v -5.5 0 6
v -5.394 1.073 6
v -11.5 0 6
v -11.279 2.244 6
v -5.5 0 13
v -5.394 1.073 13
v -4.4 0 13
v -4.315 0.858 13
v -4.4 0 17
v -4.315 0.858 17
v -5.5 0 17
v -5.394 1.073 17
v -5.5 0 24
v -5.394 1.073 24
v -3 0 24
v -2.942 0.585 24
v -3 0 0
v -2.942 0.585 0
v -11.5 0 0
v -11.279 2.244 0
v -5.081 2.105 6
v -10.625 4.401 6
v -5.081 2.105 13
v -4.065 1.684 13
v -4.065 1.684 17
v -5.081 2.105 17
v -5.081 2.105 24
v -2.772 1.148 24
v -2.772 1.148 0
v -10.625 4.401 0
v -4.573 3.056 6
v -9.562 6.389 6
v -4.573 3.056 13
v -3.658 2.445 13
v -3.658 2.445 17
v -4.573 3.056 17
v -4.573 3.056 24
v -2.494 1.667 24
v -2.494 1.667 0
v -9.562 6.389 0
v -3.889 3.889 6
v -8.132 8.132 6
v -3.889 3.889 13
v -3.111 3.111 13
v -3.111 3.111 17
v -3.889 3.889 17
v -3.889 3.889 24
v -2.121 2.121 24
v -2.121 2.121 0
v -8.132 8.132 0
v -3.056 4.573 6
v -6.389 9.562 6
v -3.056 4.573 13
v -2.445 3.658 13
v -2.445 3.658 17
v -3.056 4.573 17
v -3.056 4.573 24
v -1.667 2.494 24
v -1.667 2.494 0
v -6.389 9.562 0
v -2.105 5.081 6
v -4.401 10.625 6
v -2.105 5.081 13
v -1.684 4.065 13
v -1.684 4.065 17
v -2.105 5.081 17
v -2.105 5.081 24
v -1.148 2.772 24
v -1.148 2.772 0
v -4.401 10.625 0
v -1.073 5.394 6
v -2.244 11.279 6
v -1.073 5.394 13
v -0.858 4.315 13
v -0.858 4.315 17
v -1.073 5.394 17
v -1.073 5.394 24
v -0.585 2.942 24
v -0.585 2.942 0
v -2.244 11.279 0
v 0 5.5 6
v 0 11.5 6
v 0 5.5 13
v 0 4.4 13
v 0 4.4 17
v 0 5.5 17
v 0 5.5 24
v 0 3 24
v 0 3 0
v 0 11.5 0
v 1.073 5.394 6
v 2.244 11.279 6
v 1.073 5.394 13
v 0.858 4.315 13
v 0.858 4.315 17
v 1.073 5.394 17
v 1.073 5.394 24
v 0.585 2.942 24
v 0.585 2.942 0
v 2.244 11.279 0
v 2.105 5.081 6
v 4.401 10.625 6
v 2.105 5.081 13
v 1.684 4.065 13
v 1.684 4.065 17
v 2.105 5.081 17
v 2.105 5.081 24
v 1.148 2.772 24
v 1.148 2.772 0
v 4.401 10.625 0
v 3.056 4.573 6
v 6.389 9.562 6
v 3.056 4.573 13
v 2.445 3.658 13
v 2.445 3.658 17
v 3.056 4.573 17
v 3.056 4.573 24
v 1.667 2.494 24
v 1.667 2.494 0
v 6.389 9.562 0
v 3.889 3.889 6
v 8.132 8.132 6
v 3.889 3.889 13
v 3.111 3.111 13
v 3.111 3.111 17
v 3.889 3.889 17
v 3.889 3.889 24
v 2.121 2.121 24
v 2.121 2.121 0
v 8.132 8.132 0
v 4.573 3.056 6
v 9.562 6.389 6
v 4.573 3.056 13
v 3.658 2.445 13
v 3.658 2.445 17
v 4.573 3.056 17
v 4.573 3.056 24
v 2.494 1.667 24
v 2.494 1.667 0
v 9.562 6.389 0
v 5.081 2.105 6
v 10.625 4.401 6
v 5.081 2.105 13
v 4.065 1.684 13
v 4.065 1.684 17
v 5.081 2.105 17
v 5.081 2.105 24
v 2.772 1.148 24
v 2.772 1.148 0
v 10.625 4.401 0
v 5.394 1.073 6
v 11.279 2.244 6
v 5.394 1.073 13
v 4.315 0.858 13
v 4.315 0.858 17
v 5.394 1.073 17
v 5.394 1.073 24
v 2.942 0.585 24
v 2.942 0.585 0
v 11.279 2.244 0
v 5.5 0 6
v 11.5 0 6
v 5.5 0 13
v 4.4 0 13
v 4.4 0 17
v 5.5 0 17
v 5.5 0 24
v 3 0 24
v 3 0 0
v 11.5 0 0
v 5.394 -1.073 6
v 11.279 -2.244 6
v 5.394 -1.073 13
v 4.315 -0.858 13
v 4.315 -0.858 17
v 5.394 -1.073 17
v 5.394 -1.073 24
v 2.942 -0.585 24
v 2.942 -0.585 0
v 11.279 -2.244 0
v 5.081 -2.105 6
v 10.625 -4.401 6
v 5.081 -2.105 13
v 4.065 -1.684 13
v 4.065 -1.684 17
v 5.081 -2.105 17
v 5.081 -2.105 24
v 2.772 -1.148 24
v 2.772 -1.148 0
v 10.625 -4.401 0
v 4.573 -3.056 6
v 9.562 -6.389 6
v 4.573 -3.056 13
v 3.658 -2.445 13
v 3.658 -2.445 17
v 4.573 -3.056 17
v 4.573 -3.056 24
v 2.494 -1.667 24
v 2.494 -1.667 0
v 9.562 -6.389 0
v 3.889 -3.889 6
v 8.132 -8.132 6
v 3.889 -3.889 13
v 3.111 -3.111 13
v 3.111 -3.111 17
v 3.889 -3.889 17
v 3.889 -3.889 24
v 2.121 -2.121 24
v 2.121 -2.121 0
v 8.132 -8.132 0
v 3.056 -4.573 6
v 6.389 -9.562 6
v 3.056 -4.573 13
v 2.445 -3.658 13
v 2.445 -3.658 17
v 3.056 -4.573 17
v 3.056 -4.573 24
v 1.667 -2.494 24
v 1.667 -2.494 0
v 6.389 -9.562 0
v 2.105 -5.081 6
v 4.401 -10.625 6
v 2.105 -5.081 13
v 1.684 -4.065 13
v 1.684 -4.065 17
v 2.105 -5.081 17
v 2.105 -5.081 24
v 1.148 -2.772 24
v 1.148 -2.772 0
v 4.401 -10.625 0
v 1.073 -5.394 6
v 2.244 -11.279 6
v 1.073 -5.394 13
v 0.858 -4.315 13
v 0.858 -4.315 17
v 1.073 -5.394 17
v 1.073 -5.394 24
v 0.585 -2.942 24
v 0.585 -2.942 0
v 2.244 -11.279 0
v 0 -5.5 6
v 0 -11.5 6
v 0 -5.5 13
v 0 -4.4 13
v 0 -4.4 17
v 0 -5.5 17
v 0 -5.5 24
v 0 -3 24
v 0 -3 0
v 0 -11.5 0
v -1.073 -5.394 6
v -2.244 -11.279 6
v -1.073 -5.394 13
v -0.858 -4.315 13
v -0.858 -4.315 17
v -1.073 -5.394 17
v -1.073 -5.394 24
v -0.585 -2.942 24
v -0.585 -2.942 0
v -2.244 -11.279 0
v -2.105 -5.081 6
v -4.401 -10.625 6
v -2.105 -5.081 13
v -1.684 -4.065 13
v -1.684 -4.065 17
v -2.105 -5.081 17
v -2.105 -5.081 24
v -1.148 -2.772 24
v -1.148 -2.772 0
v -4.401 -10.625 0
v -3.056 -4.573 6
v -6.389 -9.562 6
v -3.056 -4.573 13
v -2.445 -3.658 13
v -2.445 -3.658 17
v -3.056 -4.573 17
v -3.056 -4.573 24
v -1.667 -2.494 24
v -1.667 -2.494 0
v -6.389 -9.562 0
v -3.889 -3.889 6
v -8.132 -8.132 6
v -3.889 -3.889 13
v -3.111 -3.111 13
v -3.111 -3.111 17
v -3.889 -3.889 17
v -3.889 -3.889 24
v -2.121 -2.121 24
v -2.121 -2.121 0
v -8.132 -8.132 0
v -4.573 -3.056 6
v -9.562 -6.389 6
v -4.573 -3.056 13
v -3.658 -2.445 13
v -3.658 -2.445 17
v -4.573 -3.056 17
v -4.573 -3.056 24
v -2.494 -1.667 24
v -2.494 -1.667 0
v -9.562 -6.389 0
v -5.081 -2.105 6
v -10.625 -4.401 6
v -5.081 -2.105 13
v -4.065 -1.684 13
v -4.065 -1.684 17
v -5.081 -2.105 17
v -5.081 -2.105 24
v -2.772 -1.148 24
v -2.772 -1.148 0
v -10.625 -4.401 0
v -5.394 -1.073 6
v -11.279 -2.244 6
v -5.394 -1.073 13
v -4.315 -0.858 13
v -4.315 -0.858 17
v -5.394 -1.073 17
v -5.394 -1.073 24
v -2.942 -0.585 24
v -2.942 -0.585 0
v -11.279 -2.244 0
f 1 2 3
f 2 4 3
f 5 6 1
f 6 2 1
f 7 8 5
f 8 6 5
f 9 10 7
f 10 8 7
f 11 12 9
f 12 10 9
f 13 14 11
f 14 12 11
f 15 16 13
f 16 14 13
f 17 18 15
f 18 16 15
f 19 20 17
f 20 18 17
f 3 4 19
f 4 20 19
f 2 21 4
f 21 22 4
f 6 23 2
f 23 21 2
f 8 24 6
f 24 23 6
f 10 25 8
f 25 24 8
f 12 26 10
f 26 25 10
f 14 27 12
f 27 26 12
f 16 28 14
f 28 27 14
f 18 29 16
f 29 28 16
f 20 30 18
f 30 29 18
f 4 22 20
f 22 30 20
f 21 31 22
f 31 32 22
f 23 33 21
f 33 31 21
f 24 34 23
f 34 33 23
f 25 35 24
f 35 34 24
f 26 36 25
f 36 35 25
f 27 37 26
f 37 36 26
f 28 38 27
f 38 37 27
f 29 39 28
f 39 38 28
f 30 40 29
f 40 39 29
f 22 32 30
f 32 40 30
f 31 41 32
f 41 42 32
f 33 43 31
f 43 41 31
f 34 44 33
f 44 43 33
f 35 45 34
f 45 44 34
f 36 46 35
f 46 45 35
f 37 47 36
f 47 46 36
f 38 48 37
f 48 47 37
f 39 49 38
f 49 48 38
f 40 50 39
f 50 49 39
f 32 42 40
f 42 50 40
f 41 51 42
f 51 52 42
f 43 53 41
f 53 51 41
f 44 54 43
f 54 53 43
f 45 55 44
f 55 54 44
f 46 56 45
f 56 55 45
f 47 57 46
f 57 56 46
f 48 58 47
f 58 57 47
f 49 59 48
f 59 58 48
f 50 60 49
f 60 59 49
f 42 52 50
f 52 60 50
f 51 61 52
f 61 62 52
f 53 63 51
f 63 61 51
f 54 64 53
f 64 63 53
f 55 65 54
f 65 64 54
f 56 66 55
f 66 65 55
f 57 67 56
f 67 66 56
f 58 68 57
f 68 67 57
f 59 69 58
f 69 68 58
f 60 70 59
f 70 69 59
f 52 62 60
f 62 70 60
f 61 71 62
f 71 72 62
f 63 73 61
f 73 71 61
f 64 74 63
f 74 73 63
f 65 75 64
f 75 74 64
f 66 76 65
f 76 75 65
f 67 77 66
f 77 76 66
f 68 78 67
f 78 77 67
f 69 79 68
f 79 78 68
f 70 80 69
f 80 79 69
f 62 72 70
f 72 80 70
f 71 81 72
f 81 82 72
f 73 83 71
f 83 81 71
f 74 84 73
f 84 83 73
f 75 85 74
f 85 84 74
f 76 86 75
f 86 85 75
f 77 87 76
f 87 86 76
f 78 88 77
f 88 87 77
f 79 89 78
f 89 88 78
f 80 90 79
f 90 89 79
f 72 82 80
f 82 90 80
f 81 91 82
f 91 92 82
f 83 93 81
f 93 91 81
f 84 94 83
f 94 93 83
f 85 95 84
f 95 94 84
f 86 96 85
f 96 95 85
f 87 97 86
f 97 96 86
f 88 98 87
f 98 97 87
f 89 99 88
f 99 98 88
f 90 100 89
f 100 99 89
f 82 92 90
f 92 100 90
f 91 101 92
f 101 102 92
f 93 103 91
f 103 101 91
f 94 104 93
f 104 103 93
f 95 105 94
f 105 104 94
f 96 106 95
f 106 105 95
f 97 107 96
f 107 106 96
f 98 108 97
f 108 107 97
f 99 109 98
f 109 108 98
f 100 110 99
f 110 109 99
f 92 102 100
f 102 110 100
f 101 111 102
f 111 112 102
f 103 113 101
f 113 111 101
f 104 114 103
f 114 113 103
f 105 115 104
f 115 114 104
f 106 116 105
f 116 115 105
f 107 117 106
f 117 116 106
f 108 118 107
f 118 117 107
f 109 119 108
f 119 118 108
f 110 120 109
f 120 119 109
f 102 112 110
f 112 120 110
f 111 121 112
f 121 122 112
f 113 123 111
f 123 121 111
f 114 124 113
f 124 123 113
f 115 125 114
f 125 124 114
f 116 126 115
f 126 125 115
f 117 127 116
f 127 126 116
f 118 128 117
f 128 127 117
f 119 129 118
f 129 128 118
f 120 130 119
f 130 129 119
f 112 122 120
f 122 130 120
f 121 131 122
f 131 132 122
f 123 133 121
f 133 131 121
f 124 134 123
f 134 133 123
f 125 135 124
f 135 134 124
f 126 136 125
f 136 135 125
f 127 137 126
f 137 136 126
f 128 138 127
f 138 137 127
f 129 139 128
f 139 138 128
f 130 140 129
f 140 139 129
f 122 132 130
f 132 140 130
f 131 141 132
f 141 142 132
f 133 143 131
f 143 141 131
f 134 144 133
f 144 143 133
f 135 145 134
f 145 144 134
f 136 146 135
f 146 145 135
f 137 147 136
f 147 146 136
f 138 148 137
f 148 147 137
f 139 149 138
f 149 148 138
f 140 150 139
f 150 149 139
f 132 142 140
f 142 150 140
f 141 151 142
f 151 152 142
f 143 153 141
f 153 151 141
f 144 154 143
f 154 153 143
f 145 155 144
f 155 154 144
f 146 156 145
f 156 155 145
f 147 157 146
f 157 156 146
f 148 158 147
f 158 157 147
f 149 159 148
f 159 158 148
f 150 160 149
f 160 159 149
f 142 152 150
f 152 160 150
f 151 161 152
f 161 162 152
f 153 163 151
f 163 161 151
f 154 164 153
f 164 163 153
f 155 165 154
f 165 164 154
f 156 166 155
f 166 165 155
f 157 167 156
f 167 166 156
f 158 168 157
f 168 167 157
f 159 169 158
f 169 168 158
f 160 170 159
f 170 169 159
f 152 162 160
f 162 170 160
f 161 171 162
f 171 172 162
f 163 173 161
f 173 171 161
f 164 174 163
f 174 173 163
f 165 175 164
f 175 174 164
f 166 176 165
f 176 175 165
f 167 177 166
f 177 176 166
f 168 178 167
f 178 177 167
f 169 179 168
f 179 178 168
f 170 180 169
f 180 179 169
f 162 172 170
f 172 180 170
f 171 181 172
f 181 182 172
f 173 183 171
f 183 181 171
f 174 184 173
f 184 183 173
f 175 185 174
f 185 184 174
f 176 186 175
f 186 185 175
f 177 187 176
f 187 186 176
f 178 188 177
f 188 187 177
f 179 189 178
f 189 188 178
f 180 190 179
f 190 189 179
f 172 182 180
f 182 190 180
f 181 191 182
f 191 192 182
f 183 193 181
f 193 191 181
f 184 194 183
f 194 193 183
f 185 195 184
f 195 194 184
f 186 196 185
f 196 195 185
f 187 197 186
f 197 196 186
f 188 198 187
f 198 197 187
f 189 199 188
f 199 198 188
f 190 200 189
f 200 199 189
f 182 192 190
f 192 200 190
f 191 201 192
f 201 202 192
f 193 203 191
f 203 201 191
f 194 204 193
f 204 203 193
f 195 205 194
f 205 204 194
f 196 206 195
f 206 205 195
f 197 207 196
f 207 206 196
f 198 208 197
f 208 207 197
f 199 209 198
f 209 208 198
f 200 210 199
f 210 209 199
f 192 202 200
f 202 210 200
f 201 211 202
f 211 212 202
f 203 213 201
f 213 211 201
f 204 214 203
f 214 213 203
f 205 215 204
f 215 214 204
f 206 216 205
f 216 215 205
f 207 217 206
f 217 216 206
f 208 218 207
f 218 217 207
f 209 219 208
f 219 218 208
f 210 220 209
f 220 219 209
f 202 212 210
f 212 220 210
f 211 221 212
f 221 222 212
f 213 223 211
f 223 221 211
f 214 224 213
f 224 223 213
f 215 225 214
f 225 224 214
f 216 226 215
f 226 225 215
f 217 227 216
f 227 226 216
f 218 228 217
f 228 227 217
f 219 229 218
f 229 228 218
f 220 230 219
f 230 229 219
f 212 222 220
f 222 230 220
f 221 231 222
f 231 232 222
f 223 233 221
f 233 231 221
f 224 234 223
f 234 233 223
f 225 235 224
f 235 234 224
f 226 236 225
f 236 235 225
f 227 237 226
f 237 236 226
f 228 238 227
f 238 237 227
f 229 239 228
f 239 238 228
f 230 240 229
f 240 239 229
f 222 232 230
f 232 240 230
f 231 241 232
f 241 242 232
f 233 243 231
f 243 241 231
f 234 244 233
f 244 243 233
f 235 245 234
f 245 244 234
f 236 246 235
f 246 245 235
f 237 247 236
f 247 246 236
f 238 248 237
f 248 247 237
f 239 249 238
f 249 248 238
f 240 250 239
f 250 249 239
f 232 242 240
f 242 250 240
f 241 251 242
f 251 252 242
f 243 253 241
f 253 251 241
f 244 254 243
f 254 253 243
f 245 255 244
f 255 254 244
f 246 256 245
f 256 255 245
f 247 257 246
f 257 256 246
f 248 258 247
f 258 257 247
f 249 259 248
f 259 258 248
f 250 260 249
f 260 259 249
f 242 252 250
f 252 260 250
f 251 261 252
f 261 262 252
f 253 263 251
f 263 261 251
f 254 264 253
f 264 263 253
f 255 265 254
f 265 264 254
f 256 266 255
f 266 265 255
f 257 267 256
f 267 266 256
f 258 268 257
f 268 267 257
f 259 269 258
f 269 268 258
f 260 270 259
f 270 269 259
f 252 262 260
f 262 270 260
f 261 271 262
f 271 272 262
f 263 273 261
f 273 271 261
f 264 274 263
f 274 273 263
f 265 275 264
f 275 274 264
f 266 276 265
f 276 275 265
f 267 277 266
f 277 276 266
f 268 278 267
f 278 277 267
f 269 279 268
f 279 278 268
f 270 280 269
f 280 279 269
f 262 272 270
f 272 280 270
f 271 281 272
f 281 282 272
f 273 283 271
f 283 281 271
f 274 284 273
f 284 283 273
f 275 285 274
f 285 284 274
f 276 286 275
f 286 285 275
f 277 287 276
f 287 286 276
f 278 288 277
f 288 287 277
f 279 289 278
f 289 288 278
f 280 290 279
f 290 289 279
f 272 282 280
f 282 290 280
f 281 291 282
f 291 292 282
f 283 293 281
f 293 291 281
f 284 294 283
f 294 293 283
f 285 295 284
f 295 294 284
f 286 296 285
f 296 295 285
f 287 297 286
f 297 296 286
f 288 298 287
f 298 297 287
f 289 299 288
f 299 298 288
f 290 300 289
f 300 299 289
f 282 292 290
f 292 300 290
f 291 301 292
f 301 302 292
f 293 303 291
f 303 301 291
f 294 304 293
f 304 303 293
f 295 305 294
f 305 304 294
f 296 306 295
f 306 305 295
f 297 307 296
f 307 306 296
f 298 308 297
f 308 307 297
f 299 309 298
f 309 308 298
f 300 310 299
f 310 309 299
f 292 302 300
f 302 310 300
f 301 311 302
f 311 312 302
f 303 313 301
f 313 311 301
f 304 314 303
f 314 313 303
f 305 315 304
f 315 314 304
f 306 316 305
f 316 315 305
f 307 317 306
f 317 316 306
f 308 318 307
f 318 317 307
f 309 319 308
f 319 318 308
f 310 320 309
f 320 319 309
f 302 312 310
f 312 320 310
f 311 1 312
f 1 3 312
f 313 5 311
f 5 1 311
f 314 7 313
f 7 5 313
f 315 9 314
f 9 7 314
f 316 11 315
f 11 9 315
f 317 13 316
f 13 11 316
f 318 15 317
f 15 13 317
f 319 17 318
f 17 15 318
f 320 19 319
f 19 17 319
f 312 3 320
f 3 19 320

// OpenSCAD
$fn = 32;

// ----------------------------------------------------------------------
// Grooved revolve: flanged, bore R3
// ----------------------------------------------------------------------

// --- parameters (mm) ---
bore_r = 3;               // bore radius
outer_r = 5.5;            // outer radius of the body
total_h = 24;             // overall height, Z
wall = 2.5;               // radial wall thickness
groove_w = 4;             // groove width
groove_d = 1.1;           // groove depth
grooves = 1;              // number of outer grooves
flange_r = 11.5;          // flange radius
flange_h = 6;             // flange height

bbox_x = 2 * flange_r;  // full diameter
bore_d = 2 * bore_r;  // bore diameter
body_d = 2 * outer_r;  // body diameter
flange_d = 2 * flange_r;  // flange diameter
revolve_angle = 360;  // full turn around the Z axis

profile = [[3, 0], [5.5, 0], [11.5, 0], [11.5, 6], [5.5, 6], [5.5, 13], [4.4, 13], [4.4, 17], [5.5, 17], [5.5, 24], [3, 24]];  // primary outline, 11 points, counter clockwise

// --- the one profile operation ---
rotate_extrude(angle = revolve_angle) polygon(points = profile);
